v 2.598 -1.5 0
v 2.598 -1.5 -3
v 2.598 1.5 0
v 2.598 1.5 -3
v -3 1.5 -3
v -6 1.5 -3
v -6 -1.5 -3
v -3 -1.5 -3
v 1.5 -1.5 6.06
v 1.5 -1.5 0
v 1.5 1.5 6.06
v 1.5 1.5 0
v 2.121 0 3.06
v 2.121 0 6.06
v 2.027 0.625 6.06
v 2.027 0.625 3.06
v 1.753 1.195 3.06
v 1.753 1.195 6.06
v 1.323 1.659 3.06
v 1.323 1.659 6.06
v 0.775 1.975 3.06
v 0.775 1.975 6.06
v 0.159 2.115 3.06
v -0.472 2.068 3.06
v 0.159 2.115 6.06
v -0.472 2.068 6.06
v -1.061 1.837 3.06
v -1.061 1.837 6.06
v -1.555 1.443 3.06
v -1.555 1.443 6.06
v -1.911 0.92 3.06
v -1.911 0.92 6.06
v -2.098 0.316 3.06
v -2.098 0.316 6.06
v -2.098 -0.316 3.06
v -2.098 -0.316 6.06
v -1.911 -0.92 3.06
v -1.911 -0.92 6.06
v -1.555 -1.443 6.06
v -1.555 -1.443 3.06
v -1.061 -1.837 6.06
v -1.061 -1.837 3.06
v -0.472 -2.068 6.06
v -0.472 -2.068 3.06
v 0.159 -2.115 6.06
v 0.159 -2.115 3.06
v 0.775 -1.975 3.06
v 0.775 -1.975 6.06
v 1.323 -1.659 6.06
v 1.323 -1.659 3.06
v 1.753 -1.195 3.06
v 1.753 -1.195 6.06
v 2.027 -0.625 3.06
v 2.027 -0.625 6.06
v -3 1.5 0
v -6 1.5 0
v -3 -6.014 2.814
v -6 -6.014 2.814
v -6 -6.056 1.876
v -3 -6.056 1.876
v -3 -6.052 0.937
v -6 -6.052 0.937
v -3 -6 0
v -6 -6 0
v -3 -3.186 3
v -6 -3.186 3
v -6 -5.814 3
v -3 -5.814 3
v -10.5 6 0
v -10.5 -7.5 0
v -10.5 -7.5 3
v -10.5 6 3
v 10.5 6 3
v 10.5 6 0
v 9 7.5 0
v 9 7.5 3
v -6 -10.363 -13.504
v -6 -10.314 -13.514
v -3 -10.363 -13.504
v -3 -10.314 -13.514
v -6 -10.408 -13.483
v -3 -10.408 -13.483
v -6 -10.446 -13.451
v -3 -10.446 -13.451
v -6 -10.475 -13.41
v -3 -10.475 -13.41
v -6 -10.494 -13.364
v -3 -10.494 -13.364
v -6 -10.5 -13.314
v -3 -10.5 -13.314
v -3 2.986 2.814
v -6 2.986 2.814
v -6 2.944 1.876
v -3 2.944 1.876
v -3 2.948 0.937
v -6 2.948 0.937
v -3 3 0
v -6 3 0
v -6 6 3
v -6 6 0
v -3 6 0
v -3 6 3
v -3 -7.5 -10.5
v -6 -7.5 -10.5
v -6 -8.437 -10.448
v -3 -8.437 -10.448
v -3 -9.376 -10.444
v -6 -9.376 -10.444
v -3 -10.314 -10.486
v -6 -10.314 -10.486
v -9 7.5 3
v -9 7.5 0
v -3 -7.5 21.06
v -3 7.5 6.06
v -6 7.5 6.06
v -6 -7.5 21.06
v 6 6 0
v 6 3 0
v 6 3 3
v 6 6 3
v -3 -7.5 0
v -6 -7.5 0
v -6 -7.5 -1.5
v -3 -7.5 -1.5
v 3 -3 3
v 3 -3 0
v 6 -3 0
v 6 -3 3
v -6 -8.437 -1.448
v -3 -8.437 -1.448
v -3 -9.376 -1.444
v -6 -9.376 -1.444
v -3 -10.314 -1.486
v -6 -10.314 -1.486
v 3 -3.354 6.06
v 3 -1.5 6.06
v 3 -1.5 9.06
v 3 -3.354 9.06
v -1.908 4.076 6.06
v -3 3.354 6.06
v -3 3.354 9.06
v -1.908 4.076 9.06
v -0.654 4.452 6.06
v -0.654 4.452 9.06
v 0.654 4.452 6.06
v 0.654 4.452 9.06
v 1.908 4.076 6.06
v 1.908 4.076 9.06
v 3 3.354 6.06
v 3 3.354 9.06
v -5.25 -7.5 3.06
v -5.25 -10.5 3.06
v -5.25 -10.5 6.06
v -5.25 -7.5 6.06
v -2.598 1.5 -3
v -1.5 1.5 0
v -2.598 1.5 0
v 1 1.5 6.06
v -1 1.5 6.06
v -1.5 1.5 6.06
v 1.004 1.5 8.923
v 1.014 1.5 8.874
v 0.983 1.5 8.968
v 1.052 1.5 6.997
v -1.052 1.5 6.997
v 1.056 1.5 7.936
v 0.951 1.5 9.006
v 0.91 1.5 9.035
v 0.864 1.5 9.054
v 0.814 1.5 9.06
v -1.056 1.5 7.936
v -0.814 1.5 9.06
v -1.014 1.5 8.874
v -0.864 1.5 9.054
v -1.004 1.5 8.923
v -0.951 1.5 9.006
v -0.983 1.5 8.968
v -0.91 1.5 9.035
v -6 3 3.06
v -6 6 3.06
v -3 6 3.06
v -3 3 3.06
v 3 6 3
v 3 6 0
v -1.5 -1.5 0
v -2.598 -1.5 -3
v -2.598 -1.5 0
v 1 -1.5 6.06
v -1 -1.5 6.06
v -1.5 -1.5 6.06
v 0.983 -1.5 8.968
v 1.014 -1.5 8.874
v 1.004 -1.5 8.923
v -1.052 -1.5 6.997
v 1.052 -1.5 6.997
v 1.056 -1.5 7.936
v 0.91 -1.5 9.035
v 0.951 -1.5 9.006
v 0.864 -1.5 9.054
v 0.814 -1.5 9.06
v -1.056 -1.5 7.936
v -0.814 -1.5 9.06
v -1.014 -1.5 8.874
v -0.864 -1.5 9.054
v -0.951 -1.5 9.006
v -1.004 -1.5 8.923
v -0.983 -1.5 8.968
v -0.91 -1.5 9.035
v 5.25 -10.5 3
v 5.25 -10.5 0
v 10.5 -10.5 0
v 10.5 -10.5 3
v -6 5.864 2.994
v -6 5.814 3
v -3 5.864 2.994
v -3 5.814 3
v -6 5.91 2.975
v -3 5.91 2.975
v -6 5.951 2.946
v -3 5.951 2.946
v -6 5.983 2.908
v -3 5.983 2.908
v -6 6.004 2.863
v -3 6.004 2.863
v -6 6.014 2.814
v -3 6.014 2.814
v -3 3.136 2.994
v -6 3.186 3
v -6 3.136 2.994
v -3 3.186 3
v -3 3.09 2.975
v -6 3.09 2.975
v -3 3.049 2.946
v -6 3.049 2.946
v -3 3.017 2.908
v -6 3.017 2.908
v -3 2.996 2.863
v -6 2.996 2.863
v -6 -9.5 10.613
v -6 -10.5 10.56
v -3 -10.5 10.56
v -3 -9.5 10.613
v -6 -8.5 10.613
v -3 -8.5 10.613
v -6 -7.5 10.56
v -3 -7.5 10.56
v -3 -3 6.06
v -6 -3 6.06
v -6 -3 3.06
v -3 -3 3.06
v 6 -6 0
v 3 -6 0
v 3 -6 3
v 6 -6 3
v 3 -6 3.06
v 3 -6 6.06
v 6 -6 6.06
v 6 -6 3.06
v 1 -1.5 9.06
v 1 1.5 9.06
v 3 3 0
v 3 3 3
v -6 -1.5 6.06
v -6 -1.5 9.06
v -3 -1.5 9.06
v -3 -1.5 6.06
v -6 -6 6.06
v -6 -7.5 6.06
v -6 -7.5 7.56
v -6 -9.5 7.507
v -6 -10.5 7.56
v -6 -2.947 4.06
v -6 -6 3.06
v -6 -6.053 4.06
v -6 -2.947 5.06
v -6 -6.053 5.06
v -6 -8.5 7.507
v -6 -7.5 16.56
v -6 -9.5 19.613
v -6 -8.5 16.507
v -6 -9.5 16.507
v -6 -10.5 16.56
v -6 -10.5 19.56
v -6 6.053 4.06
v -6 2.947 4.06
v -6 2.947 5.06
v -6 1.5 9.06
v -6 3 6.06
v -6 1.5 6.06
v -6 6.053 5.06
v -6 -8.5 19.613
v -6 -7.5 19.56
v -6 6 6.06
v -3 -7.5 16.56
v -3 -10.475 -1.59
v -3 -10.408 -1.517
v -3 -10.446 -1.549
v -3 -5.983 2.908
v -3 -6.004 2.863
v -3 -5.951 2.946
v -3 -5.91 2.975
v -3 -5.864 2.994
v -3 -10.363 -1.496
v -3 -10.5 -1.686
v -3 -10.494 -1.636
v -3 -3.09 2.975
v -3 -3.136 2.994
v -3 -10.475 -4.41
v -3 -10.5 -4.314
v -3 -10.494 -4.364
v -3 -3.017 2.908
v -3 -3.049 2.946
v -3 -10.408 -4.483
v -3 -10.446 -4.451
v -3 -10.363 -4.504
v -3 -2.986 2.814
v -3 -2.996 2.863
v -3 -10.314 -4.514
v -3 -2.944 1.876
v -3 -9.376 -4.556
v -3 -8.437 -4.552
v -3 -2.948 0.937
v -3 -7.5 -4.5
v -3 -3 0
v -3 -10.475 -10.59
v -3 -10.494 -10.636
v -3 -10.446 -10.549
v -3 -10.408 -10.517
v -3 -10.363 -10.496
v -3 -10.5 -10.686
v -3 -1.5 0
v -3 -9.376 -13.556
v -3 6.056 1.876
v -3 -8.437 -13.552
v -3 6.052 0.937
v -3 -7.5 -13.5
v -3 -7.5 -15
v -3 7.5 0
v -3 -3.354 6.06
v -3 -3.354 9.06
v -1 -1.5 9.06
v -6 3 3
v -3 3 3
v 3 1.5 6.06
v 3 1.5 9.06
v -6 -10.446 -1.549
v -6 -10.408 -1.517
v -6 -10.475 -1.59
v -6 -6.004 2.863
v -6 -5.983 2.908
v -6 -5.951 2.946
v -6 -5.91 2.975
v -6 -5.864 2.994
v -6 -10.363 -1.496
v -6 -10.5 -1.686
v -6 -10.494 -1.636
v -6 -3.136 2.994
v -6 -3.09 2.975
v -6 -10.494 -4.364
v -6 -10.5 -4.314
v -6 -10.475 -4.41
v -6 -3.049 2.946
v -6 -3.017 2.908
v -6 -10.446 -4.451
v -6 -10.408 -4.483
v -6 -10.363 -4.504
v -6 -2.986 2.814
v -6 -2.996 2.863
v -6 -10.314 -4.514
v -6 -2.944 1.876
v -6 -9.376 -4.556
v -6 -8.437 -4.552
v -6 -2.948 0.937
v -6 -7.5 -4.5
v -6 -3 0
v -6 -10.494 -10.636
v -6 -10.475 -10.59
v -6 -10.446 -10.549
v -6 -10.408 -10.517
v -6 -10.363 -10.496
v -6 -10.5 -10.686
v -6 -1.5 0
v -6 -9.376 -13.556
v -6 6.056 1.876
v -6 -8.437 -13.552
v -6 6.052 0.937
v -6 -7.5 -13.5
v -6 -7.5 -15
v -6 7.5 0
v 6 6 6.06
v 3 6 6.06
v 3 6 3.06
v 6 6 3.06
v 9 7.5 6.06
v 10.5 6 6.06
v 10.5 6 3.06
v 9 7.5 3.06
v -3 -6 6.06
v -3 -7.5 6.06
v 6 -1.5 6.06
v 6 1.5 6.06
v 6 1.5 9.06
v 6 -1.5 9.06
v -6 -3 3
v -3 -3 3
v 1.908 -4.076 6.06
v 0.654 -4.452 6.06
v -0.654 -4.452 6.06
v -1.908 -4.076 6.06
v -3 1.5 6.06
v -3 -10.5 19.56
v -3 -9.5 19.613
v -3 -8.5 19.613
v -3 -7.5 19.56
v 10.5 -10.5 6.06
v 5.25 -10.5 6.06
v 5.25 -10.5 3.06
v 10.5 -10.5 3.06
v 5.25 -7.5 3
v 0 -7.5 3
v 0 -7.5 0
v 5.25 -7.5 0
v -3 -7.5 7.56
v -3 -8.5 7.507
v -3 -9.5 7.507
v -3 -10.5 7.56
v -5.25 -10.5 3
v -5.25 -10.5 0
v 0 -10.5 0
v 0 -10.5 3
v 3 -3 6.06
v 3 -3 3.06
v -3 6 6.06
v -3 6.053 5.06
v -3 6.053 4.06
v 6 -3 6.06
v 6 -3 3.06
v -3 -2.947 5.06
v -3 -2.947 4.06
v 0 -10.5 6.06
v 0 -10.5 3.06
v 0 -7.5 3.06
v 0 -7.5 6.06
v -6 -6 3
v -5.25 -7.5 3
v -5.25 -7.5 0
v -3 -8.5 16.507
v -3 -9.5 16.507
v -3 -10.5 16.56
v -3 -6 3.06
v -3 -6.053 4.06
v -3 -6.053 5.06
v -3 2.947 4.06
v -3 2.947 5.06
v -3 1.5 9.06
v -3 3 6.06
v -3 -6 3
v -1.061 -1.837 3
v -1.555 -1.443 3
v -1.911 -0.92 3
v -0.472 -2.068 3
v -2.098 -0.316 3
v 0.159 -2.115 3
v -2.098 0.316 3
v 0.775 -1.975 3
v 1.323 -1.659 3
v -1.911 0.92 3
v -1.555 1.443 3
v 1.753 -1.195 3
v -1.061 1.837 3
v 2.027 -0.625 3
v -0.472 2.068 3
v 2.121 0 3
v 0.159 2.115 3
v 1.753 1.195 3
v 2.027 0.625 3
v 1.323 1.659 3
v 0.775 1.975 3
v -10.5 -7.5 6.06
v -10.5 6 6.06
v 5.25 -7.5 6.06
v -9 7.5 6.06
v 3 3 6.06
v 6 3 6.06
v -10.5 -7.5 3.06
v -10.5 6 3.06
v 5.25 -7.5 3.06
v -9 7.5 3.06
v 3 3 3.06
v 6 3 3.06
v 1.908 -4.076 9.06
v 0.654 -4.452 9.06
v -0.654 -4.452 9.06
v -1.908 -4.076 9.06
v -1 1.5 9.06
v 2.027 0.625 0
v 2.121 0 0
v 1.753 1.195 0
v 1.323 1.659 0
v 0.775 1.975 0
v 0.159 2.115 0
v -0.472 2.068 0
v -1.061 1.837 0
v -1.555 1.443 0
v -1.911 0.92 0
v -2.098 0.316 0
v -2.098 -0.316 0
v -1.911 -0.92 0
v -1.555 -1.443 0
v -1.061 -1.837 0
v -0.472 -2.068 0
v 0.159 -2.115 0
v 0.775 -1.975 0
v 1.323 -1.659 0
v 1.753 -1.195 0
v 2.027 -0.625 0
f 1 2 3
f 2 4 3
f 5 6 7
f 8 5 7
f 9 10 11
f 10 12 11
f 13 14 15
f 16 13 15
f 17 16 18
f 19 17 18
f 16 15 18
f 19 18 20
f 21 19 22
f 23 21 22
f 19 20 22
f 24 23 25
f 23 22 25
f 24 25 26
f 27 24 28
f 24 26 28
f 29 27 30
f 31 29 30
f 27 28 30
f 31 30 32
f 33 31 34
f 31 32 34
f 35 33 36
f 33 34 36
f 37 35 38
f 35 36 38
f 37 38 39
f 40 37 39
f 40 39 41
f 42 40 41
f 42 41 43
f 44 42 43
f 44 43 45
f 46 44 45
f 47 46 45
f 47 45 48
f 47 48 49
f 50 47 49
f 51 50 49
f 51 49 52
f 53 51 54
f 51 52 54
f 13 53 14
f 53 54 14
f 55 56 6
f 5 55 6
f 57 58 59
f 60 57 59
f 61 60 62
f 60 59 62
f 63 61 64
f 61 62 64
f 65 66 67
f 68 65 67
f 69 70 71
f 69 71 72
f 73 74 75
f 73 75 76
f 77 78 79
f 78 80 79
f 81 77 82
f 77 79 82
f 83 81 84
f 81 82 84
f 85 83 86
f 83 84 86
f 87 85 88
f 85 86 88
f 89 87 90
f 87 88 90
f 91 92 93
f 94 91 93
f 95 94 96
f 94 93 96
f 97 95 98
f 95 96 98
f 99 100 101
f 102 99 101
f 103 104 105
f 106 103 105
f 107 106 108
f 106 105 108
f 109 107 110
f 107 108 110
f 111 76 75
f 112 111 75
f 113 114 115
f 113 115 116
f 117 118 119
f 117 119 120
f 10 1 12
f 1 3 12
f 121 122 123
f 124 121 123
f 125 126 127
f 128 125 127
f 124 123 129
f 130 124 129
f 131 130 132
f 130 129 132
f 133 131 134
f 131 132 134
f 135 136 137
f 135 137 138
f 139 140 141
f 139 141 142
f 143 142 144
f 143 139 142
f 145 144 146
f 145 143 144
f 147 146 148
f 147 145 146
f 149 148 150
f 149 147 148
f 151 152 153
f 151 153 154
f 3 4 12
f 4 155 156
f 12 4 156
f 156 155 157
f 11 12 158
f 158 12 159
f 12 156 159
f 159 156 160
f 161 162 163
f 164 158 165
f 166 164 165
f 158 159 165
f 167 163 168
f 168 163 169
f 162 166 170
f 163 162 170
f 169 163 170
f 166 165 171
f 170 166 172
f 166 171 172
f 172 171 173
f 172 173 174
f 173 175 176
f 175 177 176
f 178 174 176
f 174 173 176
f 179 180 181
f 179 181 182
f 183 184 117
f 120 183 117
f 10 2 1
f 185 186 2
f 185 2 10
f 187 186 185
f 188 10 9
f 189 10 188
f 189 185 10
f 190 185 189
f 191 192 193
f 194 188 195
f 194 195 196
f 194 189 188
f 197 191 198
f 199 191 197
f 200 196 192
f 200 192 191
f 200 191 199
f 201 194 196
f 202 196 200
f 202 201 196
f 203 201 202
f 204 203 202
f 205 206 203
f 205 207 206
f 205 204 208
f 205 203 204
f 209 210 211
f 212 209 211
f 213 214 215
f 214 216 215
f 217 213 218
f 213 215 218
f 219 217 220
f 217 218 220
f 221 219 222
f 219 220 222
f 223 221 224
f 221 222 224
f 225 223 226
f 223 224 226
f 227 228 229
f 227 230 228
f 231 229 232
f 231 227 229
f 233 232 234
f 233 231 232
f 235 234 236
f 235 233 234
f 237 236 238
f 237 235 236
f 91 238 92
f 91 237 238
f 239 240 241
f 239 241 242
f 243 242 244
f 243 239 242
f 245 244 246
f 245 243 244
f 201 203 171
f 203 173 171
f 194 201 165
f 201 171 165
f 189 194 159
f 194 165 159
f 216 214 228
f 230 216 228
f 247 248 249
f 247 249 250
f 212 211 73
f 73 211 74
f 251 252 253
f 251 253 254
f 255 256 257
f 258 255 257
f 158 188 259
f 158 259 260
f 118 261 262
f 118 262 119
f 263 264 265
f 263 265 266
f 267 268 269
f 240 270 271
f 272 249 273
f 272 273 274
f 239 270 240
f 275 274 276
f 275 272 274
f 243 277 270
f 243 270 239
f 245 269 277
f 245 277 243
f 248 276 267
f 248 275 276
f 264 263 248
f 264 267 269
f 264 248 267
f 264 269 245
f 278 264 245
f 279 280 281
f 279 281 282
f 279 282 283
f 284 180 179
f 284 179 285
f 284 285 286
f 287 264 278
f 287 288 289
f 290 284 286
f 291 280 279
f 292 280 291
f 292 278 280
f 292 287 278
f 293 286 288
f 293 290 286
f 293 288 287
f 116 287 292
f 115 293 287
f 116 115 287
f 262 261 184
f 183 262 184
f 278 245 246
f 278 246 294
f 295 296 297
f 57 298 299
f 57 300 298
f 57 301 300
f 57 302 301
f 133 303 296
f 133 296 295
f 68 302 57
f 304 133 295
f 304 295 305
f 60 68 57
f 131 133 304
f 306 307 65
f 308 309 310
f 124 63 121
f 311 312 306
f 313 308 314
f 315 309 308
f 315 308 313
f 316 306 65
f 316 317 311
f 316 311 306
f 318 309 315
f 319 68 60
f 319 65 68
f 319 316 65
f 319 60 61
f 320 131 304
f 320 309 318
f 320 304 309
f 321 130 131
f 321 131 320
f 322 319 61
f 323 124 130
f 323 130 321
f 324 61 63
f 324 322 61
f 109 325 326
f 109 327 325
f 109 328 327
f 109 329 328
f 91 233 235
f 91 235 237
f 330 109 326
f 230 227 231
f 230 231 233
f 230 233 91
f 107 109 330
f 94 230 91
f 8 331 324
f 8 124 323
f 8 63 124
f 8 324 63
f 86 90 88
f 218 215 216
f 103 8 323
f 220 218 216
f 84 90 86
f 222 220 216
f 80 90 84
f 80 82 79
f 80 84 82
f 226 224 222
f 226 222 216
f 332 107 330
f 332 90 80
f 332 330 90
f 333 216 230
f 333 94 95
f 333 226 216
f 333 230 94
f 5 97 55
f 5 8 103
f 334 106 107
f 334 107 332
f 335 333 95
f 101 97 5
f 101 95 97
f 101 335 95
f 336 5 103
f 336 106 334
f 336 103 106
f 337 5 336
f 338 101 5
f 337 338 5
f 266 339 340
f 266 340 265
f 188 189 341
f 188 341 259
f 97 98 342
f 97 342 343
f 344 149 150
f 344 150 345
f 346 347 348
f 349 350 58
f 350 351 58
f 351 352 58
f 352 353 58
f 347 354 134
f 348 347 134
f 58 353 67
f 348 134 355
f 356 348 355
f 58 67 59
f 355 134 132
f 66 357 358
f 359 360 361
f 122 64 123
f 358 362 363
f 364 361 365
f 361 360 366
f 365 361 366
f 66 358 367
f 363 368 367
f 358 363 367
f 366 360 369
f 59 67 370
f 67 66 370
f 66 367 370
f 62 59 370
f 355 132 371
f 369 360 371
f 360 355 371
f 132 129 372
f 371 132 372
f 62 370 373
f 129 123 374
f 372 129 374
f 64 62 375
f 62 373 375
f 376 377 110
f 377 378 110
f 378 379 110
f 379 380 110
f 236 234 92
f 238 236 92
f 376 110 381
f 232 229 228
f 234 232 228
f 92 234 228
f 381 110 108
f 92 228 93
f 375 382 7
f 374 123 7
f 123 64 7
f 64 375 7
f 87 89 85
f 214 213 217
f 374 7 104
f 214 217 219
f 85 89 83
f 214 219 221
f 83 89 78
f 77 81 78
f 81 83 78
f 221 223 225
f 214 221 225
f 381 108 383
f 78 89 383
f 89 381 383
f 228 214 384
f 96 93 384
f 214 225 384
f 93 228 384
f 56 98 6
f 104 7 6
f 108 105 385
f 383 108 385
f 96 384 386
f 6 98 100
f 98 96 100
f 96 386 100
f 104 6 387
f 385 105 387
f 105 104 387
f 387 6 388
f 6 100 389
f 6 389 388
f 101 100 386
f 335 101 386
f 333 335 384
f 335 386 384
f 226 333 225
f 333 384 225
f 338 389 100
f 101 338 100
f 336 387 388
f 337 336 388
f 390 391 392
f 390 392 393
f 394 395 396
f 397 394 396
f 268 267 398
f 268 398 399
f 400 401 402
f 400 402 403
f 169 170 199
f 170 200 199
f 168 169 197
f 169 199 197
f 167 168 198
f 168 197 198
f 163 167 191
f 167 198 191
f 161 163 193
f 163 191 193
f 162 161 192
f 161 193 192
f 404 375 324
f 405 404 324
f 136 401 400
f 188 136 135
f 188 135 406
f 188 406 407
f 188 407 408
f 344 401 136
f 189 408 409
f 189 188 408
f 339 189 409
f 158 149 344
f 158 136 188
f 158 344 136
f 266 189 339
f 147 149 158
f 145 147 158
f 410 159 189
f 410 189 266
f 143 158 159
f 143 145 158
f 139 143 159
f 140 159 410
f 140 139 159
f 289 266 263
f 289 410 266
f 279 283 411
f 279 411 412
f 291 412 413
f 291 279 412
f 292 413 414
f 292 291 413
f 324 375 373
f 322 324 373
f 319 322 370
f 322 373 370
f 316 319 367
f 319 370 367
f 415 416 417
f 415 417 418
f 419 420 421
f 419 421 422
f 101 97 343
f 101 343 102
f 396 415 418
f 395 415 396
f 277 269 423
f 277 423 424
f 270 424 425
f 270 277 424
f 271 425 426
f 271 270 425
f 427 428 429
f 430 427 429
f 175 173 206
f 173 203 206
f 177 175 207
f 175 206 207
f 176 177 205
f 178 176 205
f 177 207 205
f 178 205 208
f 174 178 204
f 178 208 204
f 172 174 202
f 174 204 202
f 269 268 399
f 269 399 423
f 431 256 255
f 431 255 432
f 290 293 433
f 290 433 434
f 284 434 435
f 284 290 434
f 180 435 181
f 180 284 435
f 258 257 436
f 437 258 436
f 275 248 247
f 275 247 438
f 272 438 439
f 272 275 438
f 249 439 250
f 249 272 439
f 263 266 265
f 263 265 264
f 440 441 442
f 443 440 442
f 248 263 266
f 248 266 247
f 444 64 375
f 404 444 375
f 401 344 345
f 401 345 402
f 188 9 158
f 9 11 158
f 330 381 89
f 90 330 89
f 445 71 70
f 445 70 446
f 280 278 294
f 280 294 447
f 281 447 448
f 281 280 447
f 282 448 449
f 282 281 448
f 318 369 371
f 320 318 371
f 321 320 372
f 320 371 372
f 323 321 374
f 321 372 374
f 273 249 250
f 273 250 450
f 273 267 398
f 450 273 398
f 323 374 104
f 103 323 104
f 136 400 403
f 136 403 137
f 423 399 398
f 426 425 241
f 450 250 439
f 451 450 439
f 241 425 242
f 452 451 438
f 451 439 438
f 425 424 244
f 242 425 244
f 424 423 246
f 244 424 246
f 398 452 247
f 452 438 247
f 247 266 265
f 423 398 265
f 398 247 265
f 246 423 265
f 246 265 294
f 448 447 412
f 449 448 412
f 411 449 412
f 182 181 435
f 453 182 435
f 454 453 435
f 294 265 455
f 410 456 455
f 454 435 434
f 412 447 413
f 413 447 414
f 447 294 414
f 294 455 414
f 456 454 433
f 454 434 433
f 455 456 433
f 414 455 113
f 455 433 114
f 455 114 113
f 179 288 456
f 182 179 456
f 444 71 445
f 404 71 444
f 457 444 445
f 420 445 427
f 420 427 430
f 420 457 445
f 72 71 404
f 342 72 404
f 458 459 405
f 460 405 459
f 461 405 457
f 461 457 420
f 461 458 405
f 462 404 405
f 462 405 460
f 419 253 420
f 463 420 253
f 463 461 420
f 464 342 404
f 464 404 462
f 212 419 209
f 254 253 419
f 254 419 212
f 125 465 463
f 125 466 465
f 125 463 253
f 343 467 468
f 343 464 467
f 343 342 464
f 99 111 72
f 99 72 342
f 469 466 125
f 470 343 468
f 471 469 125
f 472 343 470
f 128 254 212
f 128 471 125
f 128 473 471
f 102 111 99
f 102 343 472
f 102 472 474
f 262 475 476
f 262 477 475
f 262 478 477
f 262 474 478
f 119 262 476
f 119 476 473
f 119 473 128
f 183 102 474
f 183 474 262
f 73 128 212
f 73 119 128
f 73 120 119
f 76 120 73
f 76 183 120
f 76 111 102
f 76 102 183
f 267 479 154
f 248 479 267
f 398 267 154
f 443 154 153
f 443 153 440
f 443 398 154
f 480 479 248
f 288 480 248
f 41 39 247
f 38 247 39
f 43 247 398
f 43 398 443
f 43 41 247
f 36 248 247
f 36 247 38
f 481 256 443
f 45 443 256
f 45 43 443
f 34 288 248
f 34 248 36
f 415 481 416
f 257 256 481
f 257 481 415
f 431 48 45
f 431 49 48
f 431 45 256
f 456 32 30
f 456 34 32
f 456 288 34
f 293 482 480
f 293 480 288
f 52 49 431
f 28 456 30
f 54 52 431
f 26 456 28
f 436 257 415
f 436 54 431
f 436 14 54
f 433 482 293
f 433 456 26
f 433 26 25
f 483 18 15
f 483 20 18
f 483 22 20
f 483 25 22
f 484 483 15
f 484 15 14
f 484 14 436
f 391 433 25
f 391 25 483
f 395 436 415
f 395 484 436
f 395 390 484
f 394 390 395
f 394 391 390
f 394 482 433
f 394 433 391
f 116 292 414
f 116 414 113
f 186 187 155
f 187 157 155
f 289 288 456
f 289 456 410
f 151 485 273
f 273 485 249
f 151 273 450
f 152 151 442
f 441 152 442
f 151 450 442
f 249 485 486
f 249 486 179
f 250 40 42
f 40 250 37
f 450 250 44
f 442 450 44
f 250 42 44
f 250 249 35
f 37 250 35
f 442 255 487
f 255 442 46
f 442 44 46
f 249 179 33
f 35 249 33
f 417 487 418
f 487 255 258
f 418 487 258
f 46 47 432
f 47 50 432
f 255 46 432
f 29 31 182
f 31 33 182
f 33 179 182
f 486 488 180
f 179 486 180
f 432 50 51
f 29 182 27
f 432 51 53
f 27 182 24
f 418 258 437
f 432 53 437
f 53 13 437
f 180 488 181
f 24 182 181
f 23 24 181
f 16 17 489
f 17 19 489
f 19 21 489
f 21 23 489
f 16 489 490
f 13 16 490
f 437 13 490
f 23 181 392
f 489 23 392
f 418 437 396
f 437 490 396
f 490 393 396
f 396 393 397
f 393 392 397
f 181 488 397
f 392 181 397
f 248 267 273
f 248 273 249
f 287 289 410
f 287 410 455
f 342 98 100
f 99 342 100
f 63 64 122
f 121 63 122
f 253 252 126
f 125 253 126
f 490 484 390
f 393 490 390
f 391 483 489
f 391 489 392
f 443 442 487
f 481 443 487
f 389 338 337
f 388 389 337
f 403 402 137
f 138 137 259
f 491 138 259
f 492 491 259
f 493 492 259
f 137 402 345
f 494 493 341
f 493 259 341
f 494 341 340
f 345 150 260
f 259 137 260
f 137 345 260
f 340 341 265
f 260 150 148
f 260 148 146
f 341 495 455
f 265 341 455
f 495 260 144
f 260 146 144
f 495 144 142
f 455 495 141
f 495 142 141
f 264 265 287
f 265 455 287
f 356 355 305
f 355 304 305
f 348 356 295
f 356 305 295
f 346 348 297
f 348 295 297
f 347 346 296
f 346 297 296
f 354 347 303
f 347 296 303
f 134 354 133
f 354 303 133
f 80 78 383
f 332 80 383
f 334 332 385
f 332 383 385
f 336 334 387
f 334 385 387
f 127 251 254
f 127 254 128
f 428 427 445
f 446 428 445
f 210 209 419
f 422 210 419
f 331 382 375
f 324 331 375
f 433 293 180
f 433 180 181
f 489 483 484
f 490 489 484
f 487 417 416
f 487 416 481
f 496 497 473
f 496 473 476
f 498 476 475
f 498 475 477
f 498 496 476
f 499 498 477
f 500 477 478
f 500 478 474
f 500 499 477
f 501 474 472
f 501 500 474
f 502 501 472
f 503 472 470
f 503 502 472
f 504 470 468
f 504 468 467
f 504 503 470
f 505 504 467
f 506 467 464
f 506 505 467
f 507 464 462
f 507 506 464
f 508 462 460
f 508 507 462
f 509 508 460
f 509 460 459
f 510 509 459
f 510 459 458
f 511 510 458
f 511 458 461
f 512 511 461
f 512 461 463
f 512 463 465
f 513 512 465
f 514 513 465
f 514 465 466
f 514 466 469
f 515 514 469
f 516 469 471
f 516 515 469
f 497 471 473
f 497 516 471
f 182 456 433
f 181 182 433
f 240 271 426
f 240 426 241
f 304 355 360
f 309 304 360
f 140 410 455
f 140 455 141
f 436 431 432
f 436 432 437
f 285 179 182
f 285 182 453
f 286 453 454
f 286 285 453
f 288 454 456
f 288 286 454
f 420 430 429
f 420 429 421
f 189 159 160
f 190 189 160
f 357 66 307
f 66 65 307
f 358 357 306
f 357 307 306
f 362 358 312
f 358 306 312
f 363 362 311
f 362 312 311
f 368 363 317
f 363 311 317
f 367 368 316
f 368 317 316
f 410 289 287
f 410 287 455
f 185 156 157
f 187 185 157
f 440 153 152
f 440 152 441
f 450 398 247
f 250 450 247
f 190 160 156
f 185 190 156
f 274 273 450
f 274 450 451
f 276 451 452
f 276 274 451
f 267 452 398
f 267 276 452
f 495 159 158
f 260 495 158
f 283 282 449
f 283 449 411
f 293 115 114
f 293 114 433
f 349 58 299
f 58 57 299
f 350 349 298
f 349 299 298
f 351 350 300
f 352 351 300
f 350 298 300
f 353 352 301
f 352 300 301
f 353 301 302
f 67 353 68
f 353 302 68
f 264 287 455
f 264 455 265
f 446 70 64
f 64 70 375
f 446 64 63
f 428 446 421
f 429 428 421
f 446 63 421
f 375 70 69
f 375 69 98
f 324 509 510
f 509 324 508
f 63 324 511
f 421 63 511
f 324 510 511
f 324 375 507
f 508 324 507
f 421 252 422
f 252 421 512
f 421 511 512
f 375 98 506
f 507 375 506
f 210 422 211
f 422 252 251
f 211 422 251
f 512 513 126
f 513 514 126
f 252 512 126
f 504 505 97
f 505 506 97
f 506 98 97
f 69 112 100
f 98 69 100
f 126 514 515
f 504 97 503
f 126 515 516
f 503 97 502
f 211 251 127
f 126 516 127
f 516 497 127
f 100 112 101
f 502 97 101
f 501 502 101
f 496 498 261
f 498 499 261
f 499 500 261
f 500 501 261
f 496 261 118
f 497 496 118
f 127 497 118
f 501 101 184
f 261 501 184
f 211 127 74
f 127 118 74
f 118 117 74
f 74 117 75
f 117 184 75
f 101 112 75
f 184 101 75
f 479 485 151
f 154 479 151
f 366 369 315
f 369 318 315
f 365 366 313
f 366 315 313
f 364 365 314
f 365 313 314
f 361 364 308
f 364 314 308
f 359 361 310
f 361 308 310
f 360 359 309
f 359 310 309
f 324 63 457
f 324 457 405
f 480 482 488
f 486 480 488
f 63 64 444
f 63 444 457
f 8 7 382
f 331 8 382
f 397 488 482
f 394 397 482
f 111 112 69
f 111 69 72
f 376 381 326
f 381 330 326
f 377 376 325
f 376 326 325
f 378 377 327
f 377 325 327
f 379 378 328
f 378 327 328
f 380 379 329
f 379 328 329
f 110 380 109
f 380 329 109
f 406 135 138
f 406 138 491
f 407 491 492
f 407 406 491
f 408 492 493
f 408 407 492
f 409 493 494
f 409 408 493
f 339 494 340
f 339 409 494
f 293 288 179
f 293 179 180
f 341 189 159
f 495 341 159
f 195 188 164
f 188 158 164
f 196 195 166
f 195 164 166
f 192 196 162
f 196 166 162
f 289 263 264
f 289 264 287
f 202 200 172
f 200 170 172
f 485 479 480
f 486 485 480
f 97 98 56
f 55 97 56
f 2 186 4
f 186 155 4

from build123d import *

# Parameters (mm, degrees)
SCHIZZO1_W                    = 21
SCHIZZO1_H                    = 21
SCHIZZO1_R                    = 2.121320344
SCHIZZO1_W_2                  = 3
SCHIZZO1_H_2                  = 3
ESTRUSIONE_ESTRUSIONE1_DEPTH  = 3
TAGLIO_ESTRUSIONE1_REACH      = 5
SCHIZZO6_W                    = 5.25
SCHIZZO6_H                    = 3
ESTRUSIONE_ESTRUSIONE2_DEPTH  = 3
ESTRUSIONE_ESTRUSIONE4_DEPTH  = 1.5
TAGLIO_ESTRUSIONE2_DEPTH      = 1
TAGLIO_ESTRUSIONE2_DEPTH_BACK = 22
SMUSSO1_SIZE                  = 1.5
SCHIZZO5_W                    = 2
SCHIZZO5_H                    = 3
ESTRUSIONE_ESTRUSIONE5_DEPTH  = 3
RACCORDO1_R                   = 0.2
RACCORDO2_R                   = 0.2


with BuildPart() as part:
    # Schizzo1 → Estrusione-Estrusione1 (new body)
    with BuildSketch(Plane.XY):
        Rectangle(SCHIZZO1_W, SCHIZZO1_H)
        Circle(SCHIZZO1_R, mode=Mode.SUBTRACT)
        with Locations((-4.5, 4.5)):
            Rectangle(SCHIZZO1_W_2, SCHIZZO1_H_2, mode=Mode.SUBTRACT)
        with Locations((-4.5, -4.5)):
            Rectangle(SCHIZZO1_W_2, SCHIZZO1_H_2, mode=Mode.SUBTRACT)
        with Locations((4.5, -4.5)):
            Rectangle(SCHIZZO1_W_2, SCHIZZO1_H_2, mode=Mode.SUBTRACT)
        with Locations((4.5, 4.5)):
            Rectangle(SCHIZZO1_W_2, SCHIZZO1_H_2, mode=Mode.SUBTRACT)
    extrude(amount=ESTRUSIONE_ESTRUSIONE1_DEPTH)

    # Schizzo6 → Taglio-Estrusione1 (cut, up to next)
    with BuildSketch(Plane.XY.offset(3), mode=Mode.PRIVATE) as taglio_estrusione1_sk1:
        with Locations((-7.875, -9)):
            Rectangle(SCHIZZO6_W, SCHIZZO6_H)
    taglio_estrusione1_tool1 = extrude(taglio_estrusione1_sk1.sketch, amount=-TAGLIO_ESTRUSIONE1_REACH, mode=Mode.PRIVATE) & part.part
    add(taglio_estrusione1_tool1.solids().sort_by_distance((-7.875, -9, 3))[0], mode=Mode.SUBTRACT)
    # Schizzo6 → Taglio-Estrusione1 (cut, up to next)
    with BuildSketch(Plane.XY.offset(3), mode=Mode.PRIVATE) as taglio_estrusione1_sk2:
        with Locations((2.625, -9)):
            Rectangle(SCHIZZO6_W, SCHIZZO6_H)
    taglio_estrusione1_tool2 = extrude(taglio_estrusione1_sk2.sketch, amount=-TAGLIO_ESTRUSIONE1_REACH, mode=Mode.PRIVATE) & part.part
    add(taglio_estrusione1_tool2.solids().sort_by_distance((2.625, -9, 3))[0], mode=Mode.SUBTRACT)


with BuildPart() as body_2:
    # Schizzo2 → Estrusione-Estrusione2 (new body)
    with BuildSketch(Plane(origin=(-6, 0, 0), x_dir=(0, 0, -1), z_dir=(1, 0, 0))):
        with BuildLine():
            Line((-3, 6), (-3, 3))
            ThreePointArc((-3, 3), (-1.5, 2.94), (0, 3))
            Line((0, 3), (0, 1.5))
            Line((0, 1.5), (3, 1.5))
            Line((3, 1.5), (3, -1.5))
            Line((3, -1.5), (0, -1.5))
            Line((0, -1.5), (0, -3))
            ThreePointArc((0, -3), (-1.5, -2.94), (-3, -3))
            Line((-3, -3), (-3, -6))
            ThreePointArc((-3, -6), (-1.5, -6.06), (0, -6))
            Line((0, -6), (0, -7.5))
            Line((0, -7.5), (1.5, -7.5))
            ThreePointArc((1.5, -7.5), (1.44, -9), (1.5, -10.5))
            Line((1.5, -10.5), (4.5, -10.5))
            ThreePointArc((4.5, -10.5), (4.56, -9), (4.5, -7.5))
            Line((4.5, -7.5), (10.5, -7.5))
            ThreePointArc((10.5, -7.5), (10.44, -9), (10.5, -10.5))
            Line((10.5, -10.5), (13.5, -10.5))
            ThreePointArc((13.5, -10.5), (13.56, -9), (13.5, -7.5))
            Line((13.5, -7.5), (15.75, -7.5))
            Line((15.75, -7.5), (15.75, -5.25))
            Line((15.75, -5.25), (2.25, 8.25))
            Line((2.25, 8.25), (0, 8.25))
            Line((0, 8.25), (0, 6))
            ThreePointArc((0, 6), (-1.5, 6.06), (-3, 6))
        make_face()
    extrude(amount=ESTRUSIONE_ESTRUSIONE2_DEPTH)


with BuildPart() as body_3:
    # Schizzo4 → Estrusione-Estrusione4 (new body, symmetric)
    with BuildSketch(Plane(origin=(0, 0, 0), x_dir=(0, 0, -1), z_dir=(0, 1, 0))):
        with BuildLine():
            Line((0, 1.5), (0, 2.598076211))
            Line((0, 2.598076211), (3, 2.598076211))
            Line((3, 2.598076211), (3, -2.598076211))
            Line((3, -2.598076211), (0, -2.598076211))
            Line((0, -2.598076211), (0, -1.5))
            Line((0, -1.5), (-6.06, -1.5))
            Line((-6.06, -1.5), (-6.06, -1))
            ThreePointArc((-6.06, -1), (-7.56, -1.06), (-9.06, -1))
            Line((-9.06, -1), (-9.06, 1))
            ThreePointArc((-9.06, 1), (-7.56, 1.06), (-6.06, 1))
            Line((-6.06, 1), (-6.06, 1.5))
            Line((-6.06, 1.5), (0, 1.5))
        make_face()
    extrude(amount=ESTRUSIONE_ESTRUSIONE4_DEPTH, both=True)

    # Raccordo1
    raccordo1_edges = [body_3.edges().sort_by_distance(p)[0] for p in [
        (1, 0, 9.06),
        (-1, 0, 9.06),
    ]]
    fillet(raccordo1_edges, radius=RACCORDO1_R)


with BuildPart() as taglio_estrusione2_tool:
    # Schizzo8 → Taglio-Estrusione2 (new body, two sides)
    with BuildSketch(Plane(origin=(10.5, 0, 0), x_dir=(0, 0, -1), z_dir=(1, 0, 0))) as taglio_estrusione2_sk:
        Polygon((0, 7.5), (18, -10.5), (18, -7.5), (0, 10.5), (-3, 10.5), (-3, 7.5), align=None)
    extrude(amount=TAGLIO_ESTRUSIONE2_DEPTH)
    extrude(taglio_estrusione2_sk.sketch, amount=-TAGLIO_ESTRUSIONE2_DEPTH_BACK)


with BuildPart() as part_1:
    add(part.part)

    # Taglio-Estrusione2: cut by taglio_estrusione2_tool
    add(taglio_estrusione2_tool.part, mode=Mode.SUBTRACT)

    # Smusso1
    smusso1_edges = [part_1.edges().sort_by_distance(p)[0] for p in [
        (10.5, 7.5, 1.5),
        (-10.5, 7.5, 1.5),
    ]]
    chamfer(smusso1_edges, length=SMUSSO1_SIZE)


with BuildPart() as body_2_1:
    add(body_2.part)

    # Taglio-Estrusione2: cut by taglio_estrusione2_tool
    add(taglio_estrusione2_tool.part, mode=Mode.SUBTRACT)


with BuildPart() as body_4:
    # Schizzo5 → Estrusione-Estrusione5 (new body)
    with BuildSketch(Plane.XY.offset(6.06)):
        with BuildLine():
            Line((-3, -3.354101966), (-3, -1.5))
            Line((-3, -1.5), (-6, -1.5))
            Line((-6, -1.5), (-6, 1.5))
            Line((-6, 1.5), (-3, 1.5))
            Line((-3, 1.5), (-3, 3.354101966))
            ThreePointArc((-3, 3.354101966), (0, 4.5), (3, 3.354101966))
            Line((3, 3.354101966), (3, 1.5))
            Line((3, 1.5), (6, 1.5))
            Line((6, 1.5), (6, -1.5))
            Line((6, -1.5), (3, -1.5))
            Line((3, -1.5), (3, -3.354101966))
            ThreePointArc((3, -3.354101966), (0, -4.5), (-3, -3.354101966))
        make_face()
        Rectangle(SCHIZZO5_W, SCHIZZO5_H, mode=Mode.SUBTRACT)
    extrude(amount=ESTRUSIONE_ESTRUSIONE5_DEPTH)


with BuildPart() as body_5:
    # Specchia1: mirrored copy
    add(part_1.part.mirror(Plane(origin=(0, 0, 3.03), x_dir=(1, 0, 0), z_dir=(0, 0, -1))))


with BuildPart() as body_6:
    # Specchia1 2: mirrored copy
    add(body_2_1.part.mirror(Plane(origin=(0, 0, 3.03), x_dir=(1, 0, 0), z_dir=(0, 0, -1))))


with BuildPart() as body_2_2:
    add(body_2_1.part)

    # Raccordo2
    raccordo2_edges = [body_2_2.edges().sort_by_distance(p)[0] for p in [
        (-4.5, -10.5, -13.5),
        (-4.5, -10.5, -10.5),
        (-4.5, -10.5, -4.5),
        (-4.5, -10.5, -1.5),
        (-4.5, -6, 3),
        (-4.5, -3, 3),
        (-4.5, 3, 3),
        (-4.5, 6, 3),
    ]]
    fillet(raccordo2_edges, radius=RACCORDO2_R)


solid = Compound([body_3.part, part_1.part, body_4.part, body_5.part, body_6.part, body_2_2.part])
